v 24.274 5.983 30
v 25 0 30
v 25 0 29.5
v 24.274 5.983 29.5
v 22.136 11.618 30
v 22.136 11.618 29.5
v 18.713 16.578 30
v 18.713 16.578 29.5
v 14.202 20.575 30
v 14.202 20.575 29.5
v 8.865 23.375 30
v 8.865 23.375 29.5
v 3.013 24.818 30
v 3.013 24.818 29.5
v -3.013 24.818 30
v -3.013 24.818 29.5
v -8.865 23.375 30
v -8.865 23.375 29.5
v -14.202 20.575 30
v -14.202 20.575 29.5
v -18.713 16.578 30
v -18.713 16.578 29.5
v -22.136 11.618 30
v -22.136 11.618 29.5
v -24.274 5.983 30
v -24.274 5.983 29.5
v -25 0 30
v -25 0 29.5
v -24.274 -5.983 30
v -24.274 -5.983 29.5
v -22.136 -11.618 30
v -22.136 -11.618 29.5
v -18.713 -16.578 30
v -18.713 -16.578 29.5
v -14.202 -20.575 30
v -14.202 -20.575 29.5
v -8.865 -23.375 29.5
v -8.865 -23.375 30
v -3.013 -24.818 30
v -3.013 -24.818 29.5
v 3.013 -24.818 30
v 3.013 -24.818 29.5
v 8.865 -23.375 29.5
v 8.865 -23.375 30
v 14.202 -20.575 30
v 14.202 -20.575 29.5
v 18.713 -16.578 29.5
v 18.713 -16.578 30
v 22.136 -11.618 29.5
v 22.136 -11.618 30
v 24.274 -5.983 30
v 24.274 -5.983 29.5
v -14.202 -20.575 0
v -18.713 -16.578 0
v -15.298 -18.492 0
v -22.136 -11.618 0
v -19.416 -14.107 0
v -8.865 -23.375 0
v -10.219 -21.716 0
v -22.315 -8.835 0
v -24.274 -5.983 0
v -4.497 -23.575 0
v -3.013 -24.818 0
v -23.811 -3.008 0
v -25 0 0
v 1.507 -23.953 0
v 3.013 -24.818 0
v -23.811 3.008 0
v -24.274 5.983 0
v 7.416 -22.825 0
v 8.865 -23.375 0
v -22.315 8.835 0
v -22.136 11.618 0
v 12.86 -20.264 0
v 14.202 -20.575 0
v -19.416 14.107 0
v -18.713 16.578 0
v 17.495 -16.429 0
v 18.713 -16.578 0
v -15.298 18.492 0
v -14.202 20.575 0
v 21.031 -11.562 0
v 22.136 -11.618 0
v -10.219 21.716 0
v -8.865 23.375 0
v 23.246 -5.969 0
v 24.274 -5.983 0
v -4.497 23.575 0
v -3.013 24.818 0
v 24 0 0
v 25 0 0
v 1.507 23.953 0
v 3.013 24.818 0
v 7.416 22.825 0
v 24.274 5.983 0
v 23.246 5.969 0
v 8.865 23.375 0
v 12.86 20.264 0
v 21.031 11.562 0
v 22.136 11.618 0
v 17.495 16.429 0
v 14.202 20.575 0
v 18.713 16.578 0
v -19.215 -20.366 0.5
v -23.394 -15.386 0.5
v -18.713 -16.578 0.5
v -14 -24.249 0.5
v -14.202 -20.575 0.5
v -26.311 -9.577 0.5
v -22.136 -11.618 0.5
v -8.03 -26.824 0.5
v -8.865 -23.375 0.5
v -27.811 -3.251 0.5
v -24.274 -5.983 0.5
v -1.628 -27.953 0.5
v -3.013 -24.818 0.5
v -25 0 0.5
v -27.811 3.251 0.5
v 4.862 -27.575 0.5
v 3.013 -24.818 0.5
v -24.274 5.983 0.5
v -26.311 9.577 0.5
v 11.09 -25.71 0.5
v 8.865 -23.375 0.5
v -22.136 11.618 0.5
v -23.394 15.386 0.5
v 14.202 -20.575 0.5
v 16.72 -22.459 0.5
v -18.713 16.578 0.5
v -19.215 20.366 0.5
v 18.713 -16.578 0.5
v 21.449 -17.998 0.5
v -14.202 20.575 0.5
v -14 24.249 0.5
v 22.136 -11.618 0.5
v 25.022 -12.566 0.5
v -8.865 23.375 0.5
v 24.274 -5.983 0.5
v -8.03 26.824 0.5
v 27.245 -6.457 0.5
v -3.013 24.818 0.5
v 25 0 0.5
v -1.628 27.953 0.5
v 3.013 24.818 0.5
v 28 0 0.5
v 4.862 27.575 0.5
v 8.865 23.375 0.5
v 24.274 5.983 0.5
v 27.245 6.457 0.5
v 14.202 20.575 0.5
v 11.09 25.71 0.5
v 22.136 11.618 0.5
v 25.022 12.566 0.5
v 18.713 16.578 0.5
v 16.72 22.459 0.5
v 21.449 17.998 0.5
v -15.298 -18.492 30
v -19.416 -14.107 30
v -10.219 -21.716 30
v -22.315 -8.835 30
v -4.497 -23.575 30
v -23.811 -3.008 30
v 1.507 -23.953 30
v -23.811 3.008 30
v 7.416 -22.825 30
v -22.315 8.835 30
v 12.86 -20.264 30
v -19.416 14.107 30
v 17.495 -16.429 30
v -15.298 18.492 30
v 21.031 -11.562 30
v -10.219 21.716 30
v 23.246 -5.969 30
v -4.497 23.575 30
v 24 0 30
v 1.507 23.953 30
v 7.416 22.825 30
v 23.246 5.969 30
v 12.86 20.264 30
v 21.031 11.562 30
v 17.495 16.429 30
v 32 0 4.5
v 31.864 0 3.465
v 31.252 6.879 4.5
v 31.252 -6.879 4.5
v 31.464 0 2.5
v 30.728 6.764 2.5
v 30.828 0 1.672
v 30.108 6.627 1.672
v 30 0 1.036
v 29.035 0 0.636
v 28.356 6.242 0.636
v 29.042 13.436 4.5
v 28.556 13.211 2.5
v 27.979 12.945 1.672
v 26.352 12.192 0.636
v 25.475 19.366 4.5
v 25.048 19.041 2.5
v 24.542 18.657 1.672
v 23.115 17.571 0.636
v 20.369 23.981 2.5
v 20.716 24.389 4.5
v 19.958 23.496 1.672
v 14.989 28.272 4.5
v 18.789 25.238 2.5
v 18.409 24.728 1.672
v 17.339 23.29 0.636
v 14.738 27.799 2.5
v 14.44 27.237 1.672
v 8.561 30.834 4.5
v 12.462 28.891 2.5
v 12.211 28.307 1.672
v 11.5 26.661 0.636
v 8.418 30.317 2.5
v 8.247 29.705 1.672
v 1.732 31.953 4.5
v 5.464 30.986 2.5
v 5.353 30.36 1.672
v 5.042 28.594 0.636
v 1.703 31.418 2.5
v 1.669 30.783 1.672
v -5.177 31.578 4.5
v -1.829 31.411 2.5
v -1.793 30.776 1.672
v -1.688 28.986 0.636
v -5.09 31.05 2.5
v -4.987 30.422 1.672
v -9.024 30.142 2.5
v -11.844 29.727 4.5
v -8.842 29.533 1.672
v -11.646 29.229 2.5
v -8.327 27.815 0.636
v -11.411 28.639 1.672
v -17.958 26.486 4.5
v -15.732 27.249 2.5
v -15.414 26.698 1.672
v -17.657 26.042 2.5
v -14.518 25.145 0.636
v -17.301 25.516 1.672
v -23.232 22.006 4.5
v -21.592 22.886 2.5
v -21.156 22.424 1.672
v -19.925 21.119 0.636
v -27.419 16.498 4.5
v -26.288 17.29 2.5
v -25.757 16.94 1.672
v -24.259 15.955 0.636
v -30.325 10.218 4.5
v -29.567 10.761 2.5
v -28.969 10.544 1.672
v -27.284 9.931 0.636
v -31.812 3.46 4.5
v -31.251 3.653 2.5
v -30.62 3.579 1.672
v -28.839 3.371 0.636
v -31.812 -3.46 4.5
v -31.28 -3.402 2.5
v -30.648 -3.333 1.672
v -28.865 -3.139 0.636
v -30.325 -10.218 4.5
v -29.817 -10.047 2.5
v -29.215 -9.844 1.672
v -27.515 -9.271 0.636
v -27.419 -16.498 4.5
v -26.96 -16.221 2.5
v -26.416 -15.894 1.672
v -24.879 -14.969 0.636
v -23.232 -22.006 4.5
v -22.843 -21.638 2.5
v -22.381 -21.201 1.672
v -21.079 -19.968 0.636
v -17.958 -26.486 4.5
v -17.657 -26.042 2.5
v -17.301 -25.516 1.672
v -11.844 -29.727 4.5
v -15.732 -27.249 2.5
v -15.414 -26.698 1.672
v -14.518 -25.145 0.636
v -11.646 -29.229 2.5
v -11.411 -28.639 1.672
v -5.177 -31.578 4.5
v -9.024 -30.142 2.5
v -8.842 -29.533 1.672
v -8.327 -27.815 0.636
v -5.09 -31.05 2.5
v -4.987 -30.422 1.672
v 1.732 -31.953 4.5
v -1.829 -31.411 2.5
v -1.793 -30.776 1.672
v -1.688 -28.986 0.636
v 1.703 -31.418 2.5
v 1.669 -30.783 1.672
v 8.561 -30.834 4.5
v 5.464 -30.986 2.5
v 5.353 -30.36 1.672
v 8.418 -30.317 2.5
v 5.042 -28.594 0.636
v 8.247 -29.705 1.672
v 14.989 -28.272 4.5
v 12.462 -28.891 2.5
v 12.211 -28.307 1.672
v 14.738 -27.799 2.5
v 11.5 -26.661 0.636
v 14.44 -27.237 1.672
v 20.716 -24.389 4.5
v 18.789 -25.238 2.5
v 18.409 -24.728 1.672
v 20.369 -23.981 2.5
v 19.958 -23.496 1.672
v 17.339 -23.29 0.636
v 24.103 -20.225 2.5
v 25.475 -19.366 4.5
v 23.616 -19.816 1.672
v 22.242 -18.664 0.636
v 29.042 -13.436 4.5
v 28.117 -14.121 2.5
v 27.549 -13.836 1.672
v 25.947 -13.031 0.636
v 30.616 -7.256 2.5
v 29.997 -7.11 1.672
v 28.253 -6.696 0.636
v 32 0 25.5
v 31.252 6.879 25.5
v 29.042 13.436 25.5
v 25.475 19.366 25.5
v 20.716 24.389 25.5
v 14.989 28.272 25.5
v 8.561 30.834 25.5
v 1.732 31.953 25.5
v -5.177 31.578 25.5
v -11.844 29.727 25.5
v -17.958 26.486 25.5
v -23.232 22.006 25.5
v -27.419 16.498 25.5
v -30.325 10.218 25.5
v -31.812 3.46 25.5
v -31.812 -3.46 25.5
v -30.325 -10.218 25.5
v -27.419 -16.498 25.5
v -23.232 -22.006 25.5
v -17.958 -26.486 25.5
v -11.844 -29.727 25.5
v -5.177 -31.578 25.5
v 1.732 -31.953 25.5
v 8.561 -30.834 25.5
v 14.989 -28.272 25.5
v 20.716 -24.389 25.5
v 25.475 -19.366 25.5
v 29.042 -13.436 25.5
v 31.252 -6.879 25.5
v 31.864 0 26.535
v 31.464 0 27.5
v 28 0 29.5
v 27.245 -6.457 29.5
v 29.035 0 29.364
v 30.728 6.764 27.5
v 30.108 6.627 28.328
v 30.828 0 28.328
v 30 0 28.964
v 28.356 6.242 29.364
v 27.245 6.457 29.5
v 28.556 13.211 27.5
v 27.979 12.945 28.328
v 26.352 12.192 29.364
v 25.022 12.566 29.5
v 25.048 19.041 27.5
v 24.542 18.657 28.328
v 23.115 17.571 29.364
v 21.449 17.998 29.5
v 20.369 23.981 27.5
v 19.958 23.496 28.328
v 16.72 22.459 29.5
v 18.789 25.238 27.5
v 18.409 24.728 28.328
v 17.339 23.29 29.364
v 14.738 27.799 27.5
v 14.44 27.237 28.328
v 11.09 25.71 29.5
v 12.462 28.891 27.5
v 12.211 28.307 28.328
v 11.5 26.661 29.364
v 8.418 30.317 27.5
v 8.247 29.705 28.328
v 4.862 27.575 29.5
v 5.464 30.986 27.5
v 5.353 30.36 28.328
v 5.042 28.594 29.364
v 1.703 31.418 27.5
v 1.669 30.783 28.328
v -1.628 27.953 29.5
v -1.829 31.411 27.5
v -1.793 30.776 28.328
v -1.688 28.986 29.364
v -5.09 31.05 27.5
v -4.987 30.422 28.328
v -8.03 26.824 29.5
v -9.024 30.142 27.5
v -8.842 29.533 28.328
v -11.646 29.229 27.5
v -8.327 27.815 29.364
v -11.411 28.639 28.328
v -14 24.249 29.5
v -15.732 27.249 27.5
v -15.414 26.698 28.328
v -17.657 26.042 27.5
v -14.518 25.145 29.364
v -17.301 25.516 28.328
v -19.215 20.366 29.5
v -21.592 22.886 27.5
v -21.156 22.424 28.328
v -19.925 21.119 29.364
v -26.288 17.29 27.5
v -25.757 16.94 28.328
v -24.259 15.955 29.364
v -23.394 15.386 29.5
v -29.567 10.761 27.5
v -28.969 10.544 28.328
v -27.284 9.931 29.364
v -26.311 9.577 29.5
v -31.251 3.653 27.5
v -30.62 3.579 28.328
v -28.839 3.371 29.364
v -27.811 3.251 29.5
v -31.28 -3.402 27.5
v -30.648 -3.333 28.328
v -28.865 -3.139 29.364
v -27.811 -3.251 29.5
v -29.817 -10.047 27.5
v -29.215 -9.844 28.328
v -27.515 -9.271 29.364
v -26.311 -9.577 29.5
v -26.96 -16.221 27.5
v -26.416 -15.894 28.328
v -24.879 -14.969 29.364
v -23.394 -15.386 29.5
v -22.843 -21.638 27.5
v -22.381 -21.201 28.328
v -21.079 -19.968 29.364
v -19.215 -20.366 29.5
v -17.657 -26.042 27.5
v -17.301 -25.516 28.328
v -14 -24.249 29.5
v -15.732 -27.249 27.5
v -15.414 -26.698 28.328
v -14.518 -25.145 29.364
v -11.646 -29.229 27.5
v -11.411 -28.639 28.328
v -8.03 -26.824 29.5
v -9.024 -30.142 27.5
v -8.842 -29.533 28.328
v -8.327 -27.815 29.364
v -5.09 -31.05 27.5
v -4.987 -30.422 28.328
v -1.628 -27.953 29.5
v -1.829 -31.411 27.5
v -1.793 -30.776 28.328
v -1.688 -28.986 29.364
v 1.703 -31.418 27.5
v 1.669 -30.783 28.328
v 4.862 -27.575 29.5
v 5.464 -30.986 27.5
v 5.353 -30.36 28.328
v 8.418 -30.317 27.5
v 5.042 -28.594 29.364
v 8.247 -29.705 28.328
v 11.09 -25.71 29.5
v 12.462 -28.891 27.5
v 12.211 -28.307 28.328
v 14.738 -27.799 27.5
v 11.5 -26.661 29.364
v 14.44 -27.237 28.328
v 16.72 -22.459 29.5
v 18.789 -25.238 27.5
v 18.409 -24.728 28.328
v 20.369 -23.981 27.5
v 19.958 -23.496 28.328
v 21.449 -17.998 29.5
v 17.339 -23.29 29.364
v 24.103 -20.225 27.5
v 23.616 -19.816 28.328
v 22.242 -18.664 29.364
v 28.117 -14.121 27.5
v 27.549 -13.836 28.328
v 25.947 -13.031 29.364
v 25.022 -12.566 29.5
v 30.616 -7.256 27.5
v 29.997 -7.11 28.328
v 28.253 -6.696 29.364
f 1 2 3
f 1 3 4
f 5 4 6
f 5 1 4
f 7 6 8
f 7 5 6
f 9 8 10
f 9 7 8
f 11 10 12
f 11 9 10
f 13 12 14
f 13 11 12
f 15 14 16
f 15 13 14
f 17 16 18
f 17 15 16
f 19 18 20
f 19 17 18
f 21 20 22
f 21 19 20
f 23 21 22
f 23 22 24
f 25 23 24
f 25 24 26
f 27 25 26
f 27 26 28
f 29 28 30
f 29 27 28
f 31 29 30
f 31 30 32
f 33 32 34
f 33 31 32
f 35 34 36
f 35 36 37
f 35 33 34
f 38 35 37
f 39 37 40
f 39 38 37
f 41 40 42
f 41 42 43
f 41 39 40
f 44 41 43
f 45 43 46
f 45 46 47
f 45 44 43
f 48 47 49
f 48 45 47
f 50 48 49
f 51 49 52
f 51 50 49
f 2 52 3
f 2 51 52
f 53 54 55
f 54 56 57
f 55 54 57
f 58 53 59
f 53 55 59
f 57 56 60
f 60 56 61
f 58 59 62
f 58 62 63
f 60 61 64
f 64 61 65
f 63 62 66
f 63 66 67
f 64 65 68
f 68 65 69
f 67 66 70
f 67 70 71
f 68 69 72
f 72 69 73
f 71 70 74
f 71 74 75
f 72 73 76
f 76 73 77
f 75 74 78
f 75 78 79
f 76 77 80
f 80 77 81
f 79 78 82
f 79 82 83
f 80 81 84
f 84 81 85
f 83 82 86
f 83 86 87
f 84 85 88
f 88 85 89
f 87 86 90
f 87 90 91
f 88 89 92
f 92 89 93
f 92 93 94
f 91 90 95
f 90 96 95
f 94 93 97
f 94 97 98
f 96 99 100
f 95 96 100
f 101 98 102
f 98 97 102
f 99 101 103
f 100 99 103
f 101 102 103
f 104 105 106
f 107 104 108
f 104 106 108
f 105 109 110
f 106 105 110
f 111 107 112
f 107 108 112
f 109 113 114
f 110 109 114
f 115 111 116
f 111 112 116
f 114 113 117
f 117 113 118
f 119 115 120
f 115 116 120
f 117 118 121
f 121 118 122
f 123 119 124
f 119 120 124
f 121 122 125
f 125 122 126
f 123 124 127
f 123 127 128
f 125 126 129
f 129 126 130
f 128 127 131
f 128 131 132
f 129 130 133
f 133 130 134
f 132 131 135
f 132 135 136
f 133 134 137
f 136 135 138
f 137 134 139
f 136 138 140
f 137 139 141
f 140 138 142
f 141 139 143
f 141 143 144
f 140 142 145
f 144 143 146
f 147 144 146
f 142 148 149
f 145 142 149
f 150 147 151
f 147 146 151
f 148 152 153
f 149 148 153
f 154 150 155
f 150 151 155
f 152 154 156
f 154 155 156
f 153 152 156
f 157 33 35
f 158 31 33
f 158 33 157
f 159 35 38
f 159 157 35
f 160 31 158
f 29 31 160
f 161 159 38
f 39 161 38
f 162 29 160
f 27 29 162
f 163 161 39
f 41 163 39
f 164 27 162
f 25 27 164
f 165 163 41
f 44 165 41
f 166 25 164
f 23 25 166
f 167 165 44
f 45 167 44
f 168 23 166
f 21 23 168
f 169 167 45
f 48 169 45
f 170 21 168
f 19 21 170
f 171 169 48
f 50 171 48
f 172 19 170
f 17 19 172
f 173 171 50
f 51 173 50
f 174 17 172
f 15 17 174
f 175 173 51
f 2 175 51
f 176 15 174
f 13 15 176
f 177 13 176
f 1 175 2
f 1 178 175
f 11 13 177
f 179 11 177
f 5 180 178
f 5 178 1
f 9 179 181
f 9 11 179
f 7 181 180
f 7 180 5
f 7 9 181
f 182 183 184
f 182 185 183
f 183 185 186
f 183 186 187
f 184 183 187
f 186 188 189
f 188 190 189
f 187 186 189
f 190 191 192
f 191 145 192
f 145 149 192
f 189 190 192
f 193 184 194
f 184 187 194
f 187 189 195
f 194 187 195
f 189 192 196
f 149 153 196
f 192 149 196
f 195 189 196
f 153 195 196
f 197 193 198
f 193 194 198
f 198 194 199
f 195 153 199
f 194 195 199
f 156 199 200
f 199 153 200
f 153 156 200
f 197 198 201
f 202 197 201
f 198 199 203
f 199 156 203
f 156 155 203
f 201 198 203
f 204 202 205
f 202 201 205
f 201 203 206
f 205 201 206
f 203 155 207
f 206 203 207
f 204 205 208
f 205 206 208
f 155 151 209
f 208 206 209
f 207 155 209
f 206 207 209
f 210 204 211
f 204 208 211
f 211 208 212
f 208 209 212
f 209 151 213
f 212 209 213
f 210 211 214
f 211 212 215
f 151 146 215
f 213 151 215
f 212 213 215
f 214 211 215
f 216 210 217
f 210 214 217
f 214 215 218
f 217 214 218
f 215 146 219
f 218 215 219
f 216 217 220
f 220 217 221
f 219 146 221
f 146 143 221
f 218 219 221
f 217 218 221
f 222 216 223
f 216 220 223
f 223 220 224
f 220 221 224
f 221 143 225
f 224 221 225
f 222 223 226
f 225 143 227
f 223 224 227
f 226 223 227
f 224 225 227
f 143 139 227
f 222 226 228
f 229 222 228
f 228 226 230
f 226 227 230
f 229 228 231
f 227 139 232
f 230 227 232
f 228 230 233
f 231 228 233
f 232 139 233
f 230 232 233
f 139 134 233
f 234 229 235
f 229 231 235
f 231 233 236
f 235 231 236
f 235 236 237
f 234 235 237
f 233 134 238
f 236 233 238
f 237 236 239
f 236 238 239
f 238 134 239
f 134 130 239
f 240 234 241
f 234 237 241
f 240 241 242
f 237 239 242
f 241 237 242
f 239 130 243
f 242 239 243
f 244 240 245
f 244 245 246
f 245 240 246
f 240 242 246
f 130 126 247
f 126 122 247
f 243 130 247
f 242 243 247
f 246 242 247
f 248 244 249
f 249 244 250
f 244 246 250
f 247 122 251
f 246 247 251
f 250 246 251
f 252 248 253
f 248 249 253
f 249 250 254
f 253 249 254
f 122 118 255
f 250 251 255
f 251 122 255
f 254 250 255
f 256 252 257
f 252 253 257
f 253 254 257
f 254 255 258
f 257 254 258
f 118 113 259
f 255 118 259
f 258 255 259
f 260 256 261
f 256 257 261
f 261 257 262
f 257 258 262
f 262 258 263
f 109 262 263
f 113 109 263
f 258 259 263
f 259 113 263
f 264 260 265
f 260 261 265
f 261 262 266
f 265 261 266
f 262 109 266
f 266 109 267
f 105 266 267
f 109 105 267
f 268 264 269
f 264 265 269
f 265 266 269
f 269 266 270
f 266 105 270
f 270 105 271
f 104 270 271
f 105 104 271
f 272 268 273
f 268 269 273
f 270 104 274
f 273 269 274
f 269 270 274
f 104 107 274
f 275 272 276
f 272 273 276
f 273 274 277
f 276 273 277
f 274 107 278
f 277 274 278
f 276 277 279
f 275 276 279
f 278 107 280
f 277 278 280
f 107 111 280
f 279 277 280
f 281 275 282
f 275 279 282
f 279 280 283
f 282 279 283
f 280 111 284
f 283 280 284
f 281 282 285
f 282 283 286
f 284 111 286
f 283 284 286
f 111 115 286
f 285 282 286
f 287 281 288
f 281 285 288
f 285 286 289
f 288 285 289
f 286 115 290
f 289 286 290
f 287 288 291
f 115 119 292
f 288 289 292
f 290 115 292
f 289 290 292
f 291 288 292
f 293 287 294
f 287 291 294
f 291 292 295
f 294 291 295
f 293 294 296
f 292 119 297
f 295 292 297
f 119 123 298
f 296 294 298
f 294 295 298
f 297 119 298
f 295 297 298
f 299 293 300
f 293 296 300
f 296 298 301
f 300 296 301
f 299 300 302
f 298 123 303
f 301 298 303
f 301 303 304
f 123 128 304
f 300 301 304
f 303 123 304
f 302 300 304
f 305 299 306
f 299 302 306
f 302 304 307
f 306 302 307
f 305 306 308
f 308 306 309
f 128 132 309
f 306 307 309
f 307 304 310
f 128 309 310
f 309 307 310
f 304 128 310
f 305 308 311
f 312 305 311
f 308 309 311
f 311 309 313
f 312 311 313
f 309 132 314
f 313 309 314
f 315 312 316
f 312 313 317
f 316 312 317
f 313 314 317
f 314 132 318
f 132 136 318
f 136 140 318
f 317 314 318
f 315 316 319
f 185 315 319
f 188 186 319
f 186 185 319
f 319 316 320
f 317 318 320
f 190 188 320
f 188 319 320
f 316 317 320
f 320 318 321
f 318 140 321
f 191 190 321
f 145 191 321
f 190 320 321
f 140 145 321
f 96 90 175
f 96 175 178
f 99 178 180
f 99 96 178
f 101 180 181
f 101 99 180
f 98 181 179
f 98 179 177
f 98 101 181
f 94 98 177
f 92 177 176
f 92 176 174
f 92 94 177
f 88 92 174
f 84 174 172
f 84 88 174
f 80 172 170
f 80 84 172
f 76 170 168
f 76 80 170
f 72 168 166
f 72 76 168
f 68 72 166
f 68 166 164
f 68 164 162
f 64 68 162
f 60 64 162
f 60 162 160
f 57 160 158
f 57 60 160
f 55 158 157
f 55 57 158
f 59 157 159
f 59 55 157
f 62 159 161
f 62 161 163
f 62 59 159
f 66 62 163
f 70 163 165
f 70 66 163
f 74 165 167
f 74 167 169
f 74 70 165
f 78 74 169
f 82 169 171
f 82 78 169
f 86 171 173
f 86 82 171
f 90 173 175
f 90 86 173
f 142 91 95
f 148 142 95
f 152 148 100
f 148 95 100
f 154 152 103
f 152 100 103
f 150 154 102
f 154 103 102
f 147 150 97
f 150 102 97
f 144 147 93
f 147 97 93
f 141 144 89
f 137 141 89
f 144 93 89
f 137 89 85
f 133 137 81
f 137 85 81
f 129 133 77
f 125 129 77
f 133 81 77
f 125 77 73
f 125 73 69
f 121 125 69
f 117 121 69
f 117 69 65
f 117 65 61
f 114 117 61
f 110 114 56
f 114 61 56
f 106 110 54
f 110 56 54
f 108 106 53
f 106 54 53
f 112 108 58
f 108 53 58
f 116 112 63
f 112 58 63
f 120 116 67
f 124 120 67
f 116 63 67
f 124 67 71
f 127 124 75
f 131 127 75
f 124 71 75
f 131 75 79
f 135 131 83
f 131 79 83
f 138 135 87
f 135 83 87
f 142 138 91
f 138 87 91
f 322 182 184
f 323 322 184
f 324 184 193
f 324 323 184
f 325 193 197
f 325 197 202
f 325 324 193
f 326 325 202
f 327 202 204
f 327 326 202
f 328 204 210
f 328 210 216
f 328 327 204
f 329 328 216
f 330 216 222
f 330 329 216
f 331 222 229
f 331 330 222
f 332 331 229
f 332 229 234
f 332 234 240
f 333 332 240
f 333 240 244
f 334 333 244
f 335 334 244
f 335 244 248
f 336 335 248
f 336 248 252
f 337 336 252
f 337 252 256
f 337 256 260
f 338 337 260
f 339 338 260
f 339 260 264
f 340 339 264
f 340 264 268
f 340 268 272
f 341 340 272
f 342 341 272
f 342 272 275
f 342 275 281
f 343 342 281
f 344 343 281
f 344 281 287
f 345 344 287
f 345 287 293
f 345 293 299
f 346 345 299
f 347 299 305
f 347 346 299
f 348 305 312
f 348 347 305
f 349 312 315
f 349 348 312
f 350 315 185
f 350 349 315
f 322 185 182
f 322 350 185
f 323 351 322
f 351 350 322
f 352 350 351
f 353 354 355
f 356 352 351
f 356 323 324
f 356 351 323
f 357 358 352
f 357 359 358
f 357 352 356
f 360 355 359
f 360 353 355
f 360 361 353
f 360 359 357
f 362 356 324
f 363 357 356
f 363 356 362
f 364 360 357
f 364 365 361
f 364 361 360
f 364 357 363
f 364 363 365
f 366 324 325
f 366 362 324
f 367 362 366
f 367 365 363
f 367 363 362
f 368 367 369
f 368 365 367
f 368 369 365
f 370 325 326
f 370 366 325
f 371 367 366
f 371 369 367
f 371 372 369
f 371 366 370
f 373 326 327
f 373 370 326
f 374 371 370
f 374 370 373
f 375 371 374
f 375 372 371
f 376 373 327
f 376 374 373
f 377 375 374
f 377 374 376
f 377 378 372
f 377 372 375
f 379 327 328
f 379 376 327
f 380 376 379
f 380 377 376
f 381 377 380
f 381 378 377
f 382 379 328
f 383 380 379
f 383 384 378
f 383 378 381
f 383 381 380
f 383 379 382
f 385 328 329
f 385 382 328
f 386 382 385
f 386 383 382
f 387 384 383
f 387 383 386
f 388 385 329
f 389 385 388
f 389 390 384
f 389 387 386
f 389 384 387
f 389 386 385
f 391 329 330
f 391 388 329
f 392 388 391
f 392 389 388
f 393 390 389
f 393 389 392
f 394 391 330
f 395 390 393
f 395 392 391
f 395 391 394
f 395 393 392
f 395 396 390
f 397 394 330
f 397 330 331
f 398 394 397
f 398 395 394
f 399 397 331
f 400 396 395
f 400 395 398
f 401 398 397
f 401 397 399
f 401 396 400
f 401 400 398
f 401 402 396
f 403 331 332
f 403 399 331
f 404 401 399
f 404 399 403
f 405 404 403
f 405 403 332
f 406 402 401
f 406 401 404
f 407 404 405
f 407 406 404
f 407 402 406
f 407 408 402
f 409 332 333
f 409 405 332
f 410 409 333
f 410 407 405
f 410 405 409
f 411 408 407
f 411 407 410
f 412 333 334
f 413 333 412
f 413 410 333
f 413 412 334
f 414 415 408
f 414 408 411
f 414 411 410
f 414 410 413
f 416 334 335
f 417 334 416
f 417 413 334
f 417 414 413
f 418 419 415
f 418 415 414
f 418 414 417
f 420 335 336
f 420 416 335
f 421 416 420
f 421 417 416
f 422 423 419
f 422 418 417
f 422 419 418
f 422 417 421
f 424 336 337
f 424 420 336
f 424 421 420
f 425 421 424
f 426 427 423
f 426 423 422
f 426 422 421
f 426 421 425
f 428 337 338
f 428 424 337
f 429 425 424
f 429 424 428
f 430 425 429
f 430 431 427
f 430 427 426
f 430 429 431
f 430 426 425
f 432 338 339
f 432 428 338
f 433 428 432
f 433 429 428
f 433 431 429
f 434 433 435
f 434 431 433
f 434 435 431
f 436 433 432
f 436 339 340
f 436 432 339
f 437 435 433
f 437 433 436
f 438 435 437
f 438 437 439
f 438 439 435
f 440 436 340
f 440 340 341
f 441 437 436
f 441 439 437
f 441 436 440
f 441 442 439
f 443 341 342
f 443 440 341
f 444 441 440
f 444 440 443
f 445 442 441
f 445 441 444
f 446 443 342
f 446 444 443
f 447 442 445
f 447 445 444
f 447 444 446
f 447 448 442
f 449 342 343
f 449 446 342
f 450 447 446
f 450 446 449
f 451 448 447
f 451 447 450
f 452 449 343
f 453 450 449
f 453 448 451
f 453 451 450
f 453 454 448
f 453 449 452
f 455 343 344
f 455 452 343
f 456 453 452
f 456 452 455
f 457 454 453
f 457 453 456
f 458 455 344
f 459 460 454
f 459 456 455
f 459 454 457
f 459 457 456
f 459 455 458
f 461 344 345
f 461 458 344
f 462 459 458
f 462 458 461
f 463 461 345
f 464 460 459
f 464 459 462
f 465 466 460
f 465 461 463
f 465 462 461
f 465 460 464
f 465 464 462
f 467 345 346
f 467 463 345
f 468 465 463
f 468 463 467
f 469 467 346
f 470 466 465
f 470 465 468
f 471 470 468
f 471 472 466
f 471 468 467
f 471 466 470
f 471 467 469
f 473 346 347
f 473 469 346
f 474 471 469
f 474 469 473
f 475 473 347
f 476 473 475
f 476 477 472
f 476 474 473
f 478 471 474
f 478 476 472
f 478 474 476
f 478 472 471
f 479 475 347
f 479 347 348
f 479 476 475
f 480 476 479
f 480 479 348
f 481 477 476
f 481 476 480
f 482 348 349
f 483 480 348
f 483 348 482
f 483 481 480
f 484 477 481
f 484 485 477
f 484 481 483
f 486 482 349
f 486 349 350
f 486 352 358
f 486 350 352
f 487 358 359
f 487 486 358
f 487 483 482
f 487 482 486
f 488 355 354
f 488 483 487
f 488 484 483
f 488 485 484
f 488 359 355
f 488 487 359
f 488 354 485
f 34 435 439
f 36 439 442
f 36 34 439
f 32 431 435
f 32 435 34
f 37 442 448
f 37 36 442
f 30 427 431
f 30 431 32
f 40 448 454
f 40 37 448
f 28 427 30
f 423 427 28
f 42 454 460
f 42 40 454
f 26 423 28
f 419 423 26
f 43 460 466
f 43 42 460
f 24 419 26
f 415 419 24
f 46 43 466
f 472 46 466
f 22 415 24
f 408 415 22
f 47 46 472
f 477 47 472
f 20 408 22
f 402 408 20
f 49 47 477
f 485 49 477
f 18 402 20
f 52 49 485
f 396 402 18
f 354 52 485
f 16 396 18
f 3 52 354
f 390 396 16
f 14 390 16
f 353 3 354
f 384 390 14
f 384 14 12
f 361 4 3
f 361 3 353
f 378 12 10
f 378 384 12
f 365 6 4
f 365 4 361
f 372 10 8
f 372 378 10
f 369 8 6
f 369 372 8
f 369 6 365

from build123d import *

# Parameters (mm, degrees)
ESQUISSE1_R                     = 25
ESQUISSE1_R_2                   = 24
BOSS_EXTRU_1_DEPTH              = 30
ESQUISSE2_R                     = 32
ESQUISSE2_R_2                   = 25
BOSS_EXTRU_2_DEPTH              = 30
ESQUISSE3_R                     = 35
ESQUISSE3_R_2                   = 25
ENL_V_DE_MAT_EXTRU_MINCE1_DEPTH = 0.5
CONG_1_R                        = 4


with BuildPart() as part:
    # Esquisse1 → Boss.-Extru.1 (new body)
    with BuildSketch(Plane.XY):
        Circle(ESQUISSE1_R)
        Circle(ESQUISSE1_R_2, mode=Mode.SUBTRACT)
    extrude(amount=BOSS_EXTRU_1_DEPTH)

    # Esquisse2 → Boss.-Extru.2 (add)
    with BuildSketch(Plane.XY.offset(30)):
        Circle(ESQUISSE2_R)
        Circle(ESQUISSE2_R_2, mode=Mode.SUBTRACT)
    extrude(amount=-BOSS_EXTRU_2_DEPTH)

    # Esquisse3 → Enlèv. de mat.-Extru.-Mince1 (cut)
    with BuildSketch(Plane.XY.offset(30)):
        Circle(ESQUISSE3_R)
        Circle(ESQUISSE3_R_2, mode=Mode.SUBTRACT)
    enl_v_de_mat_extru_mince1 = extrude(amount=-ENL_V_DE_MAT_EXTRU_MINCE1_DEPTH, mode=Mode.SUBTRACT)

    # Symétrie1: Enlèv. de mat.-Extru.-Mince1 across plane
    add(enl_v_de_mat_extru_mince1.mirror(Plane.XY.offset(15)), mode=Mode.SUBTRACT)

    # Congé1
    cong_1_edges = [part.edges().sort_by_distance(p)[0] for p in [
        (-32, 0, 29.5),
        (-32, 0, 0.5),
    ]]
    fillet(cong_1_edges, radius=CONG_1_R)


solid = part.part
